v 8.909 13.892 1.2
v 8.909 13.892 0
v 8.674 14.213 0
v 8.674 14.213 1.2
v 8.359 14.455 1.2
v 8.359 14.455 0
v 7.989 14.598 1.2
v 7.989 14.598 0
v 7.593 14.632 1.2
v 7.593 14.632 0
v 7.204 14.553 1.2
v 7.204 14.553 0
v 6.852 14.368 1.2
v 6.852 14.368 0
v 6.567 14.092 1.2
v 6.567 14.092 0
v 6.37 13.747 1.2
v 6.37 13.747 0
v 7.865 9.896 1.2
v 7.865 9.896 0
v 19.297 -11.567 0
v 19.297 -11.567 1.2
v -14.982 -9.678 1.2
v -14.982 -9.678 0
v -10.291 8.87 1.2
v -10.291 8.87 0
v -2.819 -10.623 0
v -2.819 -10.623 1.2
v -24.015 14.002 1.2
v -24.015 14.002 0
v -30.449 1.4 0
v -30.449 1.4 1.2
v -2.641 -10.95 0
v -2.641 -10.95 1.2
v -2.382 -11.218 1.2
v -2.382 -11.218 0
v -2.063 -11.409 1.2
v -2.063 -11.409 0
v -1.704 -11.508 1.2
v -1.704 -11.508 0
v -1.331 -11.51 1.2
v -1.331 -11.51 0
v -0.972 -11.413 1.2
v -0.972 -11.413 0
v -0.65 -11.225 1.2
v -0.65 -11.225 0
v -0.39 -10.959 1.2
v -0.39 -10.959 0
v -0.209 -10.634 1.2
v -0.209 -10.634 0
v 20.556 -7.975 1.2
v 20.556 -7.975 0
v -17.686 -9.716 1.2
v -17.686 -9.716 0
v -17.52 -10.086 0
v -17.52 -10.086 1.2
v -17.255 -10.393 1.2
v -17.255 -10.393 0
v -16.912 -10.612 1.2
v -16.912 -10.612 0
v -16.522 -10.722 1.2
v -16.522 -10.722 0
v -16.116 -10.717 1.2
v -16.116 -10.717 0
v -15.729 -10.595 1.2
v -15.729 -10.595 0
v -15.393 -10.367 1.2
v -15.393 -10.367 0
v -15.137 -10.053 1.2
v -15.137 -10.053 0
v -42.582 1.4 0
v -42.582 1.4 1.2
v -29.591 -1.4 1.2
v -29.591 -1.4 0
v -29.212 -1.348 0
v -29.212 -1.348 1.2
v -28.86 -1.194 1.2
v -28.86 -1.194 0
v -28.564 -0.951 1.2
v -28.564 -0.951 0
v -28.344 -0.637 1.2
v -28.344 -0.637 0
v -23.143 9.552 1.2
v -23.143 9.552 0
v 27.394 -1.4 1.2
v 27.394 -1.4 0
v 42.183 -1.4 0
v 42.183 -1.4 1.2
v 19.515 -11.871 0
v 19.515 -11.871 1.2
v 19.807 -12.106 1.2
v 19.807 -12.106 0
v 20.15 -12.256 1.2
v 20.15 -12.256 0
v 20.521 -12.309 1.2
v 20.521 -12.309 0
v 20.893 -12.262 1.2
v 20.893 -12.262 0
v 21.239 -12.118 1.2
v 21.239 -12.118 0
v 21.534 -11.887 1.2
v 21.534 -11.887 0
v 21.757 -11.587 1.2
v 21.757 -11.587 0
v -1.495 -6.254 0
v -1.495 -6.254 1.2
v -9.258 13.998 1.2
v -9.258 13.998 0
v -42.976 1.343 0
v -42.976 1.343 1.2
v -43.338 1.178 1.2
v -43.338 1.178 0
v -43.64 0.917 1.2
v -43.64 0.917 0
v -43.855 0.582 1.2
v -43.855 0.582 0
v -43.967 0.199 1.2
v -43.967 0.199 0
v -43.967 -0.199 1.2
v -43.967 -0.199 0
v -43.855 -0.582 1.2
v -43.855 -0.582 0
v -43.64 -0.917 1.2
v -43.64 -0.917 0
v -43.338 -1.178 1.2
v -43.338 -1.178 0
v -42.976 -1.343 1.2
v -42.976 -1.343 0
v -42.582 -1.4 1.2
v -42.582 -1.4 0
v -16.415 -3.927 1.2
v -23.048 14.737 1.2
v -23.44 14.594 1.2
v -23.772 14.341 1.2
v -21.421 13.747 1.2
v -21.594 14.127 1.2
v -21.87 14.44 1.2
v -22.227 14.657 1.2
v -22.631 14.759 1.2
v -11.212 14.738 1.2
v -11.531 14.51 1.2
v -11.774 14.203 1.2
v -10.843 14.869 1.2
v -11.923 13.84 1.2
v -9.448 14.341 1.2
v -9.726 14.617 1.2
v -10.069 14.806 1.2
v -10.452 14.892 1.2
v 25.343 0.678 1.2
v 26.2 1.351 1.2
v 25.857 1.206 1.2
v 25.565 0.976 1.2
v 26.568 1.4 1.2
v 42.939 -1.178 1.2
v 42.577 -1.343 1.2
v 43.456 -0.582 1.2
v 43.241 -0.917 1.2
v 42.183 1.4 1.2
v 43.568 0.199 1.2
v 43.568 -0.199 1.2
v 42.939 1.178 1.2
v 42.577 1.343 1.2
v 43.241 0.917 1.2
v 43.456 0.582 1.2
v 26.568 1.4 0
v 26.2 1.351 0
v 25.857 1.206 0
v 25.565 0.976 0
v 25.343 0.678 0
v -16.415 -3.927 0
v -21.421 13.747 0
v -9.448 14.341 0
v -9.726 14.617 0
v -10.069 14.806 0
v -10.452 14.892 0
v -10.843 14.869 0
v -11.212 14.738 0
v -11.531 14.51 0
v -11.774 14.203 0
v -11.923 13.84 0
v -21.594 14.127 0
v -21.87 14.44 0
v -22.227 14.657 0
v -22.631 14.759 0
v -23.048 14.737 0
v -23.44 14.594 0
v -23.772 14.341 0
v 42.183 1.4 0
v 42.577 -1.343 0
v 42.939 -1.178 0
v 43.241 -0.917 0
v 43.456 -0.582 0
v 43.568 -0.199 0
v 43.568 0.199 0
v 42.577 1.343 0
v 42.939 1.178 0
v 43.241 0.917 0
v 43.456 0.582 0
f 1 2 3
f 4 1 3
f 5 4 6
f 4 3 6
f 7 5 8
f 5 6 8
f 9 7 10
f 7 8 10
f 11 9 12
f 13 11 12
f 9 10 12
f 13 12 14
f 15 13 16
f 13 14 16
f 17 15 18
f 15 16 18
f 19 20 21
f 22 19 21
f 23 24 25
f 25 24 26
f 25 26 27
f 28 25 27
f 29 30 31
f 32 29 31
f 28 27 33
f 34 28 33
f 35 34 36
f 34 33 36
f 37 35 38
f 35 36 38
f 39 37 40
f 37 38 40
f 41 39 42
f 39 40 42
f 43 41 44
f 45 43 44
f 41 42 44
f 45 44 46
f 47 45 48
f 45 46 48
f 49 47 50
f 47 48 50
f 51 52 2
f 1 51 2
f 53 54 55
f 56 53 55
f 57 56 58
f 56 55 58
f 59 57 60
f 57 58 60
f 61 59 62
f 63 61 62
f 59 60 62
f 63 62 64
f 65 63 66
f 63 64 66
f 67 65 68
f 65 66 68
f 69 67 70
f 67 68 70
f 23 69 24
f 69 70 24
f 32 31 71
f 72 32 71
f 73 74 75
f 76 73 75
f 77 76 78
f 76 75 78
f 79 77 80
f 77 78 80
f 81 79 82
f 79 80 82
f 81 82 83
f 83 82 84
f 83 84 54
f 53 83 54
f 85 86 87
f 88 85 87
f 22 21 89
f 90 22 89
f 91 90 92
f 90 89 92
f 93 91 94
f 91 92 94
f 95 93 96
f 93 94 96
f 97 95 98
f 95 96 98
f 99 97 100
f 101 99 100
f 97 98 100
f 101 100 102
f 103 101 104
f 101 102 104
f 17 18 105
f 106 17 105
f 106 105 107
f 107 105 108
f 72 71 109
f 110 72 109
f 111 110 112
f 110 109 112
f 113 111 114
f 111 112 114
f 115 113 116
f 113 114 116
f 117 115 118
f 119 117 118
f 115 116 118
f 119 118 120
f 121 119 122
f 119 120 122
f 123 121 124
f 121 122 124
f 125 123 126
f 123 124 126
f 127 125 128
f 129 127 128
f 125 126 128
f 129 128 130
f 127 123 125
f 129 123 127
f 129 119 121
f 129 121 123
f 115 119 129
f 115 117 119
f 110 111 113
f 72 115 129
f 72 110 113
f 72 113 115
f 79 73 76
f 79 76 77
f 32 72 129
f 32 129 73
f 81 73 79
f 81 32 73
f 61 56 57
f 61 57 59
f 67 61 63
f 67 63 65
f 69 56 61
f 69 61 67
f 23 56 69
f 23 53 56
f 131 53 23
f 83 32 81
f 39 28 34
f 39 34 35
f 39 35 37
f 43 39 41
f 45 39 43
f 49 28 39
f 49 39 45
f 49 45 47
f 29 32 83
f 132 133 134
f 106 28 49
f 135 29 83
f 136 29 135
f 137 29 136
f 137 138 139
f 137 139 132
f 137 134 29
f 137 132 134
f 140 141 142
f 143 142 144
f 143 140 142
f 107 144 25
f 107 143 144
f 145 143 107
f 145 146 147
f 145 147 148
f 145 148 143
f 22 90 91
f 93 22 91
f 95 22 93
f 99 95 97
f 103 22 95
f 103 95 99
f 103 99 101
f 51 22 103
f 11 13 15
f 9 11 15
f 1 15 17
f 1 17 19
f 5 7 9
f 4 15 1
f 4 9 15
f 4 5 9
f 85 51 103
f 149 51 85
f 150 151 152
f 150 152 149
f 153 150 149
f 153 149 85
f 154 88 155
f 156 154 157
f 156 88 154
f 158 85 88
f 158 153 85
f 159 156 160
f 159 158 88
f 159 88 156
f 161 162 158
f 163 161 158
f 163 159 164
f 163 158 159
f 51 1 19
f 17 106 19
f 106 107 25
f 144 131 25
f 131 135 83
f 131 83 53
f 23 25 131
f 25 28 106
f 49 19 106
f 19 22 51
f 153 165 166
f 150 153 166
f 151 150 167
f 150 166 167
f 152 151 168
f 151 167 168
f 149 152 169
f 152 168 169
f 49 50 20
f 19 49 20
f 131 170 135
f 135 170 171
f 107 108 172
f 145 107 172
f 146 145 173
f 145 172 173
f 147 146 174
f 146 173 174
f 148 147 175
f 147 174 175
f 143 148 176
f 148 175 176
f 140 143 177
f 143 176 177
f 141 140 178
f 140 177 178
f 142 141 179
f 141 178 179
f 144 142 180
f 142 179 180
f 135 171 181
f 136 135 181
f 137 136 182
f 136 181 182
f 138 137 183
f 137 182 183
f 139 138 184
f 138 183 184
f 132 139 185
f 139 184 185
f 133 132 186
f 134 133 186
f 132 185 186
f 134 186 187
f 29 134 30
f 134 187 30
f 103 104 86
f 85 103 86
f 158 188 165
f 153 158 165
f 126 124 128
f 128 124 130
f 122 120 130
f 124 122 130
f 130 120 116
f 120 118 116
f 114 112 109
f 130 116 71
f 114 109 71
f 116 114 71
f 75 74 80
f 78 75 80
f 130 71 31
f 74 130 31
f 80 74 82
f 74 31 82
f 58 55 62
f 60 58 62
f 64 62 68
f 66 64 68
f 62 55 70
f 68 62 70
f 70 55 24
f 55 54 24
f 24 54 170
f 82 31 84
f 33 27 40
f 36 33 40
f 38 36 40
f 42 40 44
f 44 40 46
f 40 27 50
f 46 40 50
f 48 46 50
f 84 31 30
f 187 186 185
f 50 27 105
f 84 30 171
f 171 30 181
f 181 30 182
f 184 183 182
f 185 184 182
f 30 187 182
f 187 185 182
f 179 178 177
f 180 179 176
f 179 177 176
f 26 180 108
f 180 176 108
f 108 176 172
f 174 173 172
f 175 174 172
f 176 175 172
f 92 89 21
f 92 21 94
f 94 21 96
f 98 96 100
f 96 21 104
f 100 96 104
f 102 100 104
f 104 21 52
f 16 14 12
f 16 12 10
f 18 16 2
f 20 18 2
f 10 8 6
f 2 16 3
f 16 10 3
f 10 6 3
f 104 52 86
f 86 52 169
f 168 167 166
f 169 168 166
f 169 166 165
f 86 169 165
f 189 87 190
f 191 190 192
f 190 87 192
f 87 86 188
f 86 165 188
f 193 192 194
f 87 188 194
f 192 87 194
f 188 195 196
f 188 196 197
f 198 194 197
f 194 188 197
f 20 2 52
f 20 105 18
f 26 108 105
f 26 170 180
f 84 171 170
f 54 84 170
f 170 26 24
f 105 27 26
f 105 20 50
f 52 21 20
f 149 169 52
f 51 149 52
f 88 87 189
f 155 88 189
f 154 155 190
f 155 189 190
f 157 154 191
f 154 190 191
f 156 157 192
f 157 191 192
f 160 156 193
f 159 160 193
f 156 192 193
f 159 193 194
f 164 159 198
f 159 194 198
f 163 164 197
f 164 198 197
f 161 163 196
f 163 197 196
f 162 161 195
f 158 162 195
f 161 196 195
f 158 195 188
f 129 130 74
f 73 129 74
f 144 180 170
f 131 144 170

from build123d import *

# Parameters (mm, degrees)
F1_DEPTH = 1.2


with BuildPart() as f1:
    # F0 (on Top) → F1 (new body)
    with BuildSketch(Plane.XY):
        with BuildLine():
            Line((6.3704812502, 13.7467025459), (-1.494936328, -6.2539292195))
            Line((-1.494936328, -6.2539292195), (-0.7523663042, -8.1910684925))
            Line((-0.7523663042, -8.1910684925), (6.9996274972, 11.521142834))
            Line((6.9996274972, 11.521142834), (6.4376895762, 12.5762100378))
            ThreePointArc((6.4376895762, 12.5762100378), (6.2756574717, 13.154082108), (6.3704812502, 13.7467025459))
        make_face()
        with BuildLine():
            ThreePointArc((21.7679784808, -10.2508880555), (21.9322680974, -10.9201946527), (21.7573096757, -11.5867919448))
            Line((21.7573096757, -11.5867919448), (27.3935520686, -1.4))
            Line((27.3935520686, -1.4), (26.5681530039, -1.4))
            ThreePointArc((26.5681530039, -1.4), (26.2181499387, -1.3555433798), (25.8903753784, -1.2249969349))
            Line((25.8903753784, -1.2249969349), (21.3405117264, -9.4482973485))
            Line((21.3405117264, -9.4482973485), (21.7679784808, -10.2508880555))
        make_face()
        with BuildLine():
            ThreePointArc((19.307315806, -10.2312366939), (19.1323573844, -10.897833986), (19.296647001, -11.5671405832))
            ThreePointArc((19.296647001, -11.5671405832), (20.5211324075, -12.3089696759), (21.7573096757, -11.5867919448))
            ThreePointArc((21.7573096757, -11.5867919448), (21.9322680974, -10.9201946527), (21.7679784808, -10.2508880555))
            Line((21.7679784808, -10.2508880555), (21.3405117264, -9.4482973485))
            Line((21.3405117264, -9.4482973485), (20.5323127409, -10.9090143194))
            Line((20.5323127409, -10.9090143194), (19.7475465303, -9.4355755986))
            Line((19.7475465303, -9.4355755986), (19.307315806, -10.2312366939))
        make_face()
        Polygon((-1.494936328, -6.2539292195), (-2.2541858179, -8.1845920629), (-1.5116157942, -10.1217313359), (-0.7523663042, -8.1910684925), align=None)
        Polygon((20.5557455158, -7.9748586277), (19.7475465303, -9.4355755986), (20.5323127409, -10.9090143194), (21.3405117264, -9.4482973485), align=None)
        with BuildLine():
            ThreePointArc((-0.204371223, -9.6206209378), (-0.1116288117, -10.127768624), (-0.2087417282, -10.6340975802))
            Line((-0.2087417282, -10.6340975802), (7.8650201285, 9.8963238823))
            Line((7.8650201285, 9.8963238823), (6.9996274972, 11.521142834))
            Line((6.9996274972, 11.521142834), (-0.7523663042, -8.1910684925))
            Line((-0.7523663042, -8.1910684925), (-0.204371223, -9.6206209378))
        make_face()
        with BuildLine():
            ThreePointArc((26.5681530039, 1.4), (25.8571286286, 1.2060034568), (25.343156069, 0.6777776255))
            ThreePointArc((25.343156069, 0.6777776255), (25.2226882092, -0.3869424845), (25.8903753784, -1.2249969349))
            Line((25.8903753784, -1.2249969349), (26.5681530039, 0))
            Line((26.5681530039, 0), (27.9681530039, 0))
            ThreePointArc((27.9681530039, 0), (27.5581024975, 0.9899494937), (26.5681530039, 1.4))
        make_face()
        with BuildLine():
            Line((25.343156069, 0.6777776255), (20.5557455158, -7.9748586277))
            Line((20.5557455158, -7.9748586277), (21.3405117264, -9.4482973485))
            Line((21.3405117264, -9.4482973485), (25.8903753784, -1.2249969349))
            ThreePointArc((25.8903753784, -1.2249969349), (25.2226882092, -0.3869424845), (25.343156069, 0.6777776255))
        make_face()
        with BuildLine():
            ThreePointArc((8.9090210561, 13.8924625655), (7.5931011225, 14.6320341461), (6.3704812502, 13.7467025459))
            ThreePointArc((6.3704812502, 13.7467025459), (6.2756574717, 13.154082108), (6.4376895762, 12.5762100378))
            Line((6.4376895762, 12.5762100378), (6.9996274972, 11.521142834))
            Line((6.9996274972, 11.521142834), (7.6733553161, 13.2343363017))
            Line((7.6733553161, 13.2343363017), (8.5387479474, 11.6095173501))
            Line((8.5387479474, 11.6095173501), (8.9762293821, 12.7219700574))
            ThreePointArc((8.9762293821, 12.7219700574), (9.0710531606, 13.3145904953), (8.9090210561, 13.8924625655))
        make_face()
        Polygon((-11.1613144434, 11.1400828532), (-10.291221096, 8.8702740266), (-9.6952787124, 11.2269554259), (-10.5653720597, 13.4967642526), align=None)
        with BuildLine():
            Line((-11.9226489058, 13.8399836623), (-16.4153779515, -3.9267187325))
            Line((-16.4153779515, -3.9267187325), (-15.6524504368, -6.6203197433))
            Line((-15.6524504368, -6.6203197433), (-11.1613144434, 11.1400828532))
            Line((-11.1613144434, 11.1400828532), (-11.8726166309, 12.9956538545))
            ThreePointArc((-11.8726166309, 12.9956538545), (-11.9629205569, 13.4139500136), (-11.9226489058, 13.8399836623))
        make_face()
        with BuildLine():
            ThreePointArc((-9.2581274886, 13.9978746507), (-10.6481862987, 14.8943127497), (-11.9226489058, 13.8399836623))
            ThreePointArc((-11.9226489058, 13.8399836623), (-11.9629205569, 13.4139500136), (-11.8726166309, 12.9956538545))
            Line((-11.8726166309, 12.9956538545), (-11.1613144434, 11.1400828532))
            Line((-11.1613144434, 11.1400828532), (-10.5653720597, 13.4967642526))
            Line((-10.5653720597, 13.4967642526), (-9.6952787124, 11.2269554259))
            Line((-9.6952787124, 11.2269554259), (-9.2080952137, 13.1535448428))
            ThreePointArc((-9.2080952137, 13.1535448428), (-9.1678235626, 13.5795784916), (-9.2581274886, 13.9978746507))
        make_face()
        with BuildLine():
            Line((-9.2080952137, 13.1535448428), (-9.6952787124, 11.2269554259))
            Line((-9.6952787124, 11.2269554259), (-2.2541858179, -8.1845920629))
            Line((-2.2541858179, -8.1845920629), (-1.494936328, -6.2539292195))
            Line((-1.494936328, -6.2539292195), (-9.2581274886, 13.9978746507))
            ThreePointArc((-9.2581274886, 13.9978746507), (-9.1678235626, 13.5795784916), (-9.2080952137, 13.1535448428))
        make_face()
        with BuildLine():
            Line((27.7931499387, -0.6777776255), (27.3935520686, -1.4))
            Line((27.3935520686, -1.4), (42.1826000015, -1.4))
            ThreePointArc((42.1826000015, -1.4), (43.5826000015, 0), (42.1826000015, 1.4))
            Line((42.1826000015, 1.4), (26.5681530039, 1.4))
            ThreePointArc((26.5681530039, 1.4), (27.5581024975, 0.9899494937), (27.9681530039, 0))
            ThreePointArc((27.9681530039, 0), (27.9236963836, -0.3500030651), (27.7931499387, -0.6777776255))
        make_face()
        with BuildLine():
            ThreePointArc((-29.5913815498, -1.4), (-30.5813310435, -0.9899494937), (-30.9913815498, 0))
            ThreePointArc((-30.9913815498, 0), (-30.9525728971, 0.327350143), (-30.8382985268, 0.6365516888))
            Line((-30.8382985268, 0.6365516888), (-30.4485578137, 1.4))
            Line((-30.4485578137, 1.4), (-42.5815542539, 1.4))
            ThreePointArc((-42.5815542539, 1.4), (-43.9815542539, 0), (-42.5815542539, -1.4))
            Line((-42.5815542539, -1.4), (-29.5913815498, -1.4))
        make_face()
        with BuildLine():
            Line((-29.5913815498, 0), (-30.9913815498, 0))
            ThreePointArc((-30.9913815498, 0), (-30.5813310435, -0.9899494937), (-29.5913815498, -1.4))
            ThreePointArc((-29.5913815498, -1.4), (-28.8603454236, -1.1939791381), (-28.3444645728, -0.6365516888))
            ThreePointArc((-28.3444645728, -0.6365516888), (-28.2595680841, 0.4315934343), (-28.9548298611, 1.246916977))
            Line((-28.9548298611, 1.246916977), (-29.5913815498, 0))
        make_face()
        with BuildLine():
            ThreePointArc((-29.5913815498, 1.4), (-29.2640314069, 1.3611913473), (-28.9548298611, 1.246916977))
            Line((-28.9548298611, 1.246916977), (-23.7041070264, 11.532358929))
            Line((-23.7041070264, 11.532358929), (-24.1152732197, 12.9840272101))
            ThreePointArc((-24.1152732197, 12.9840272101), (-24.1615440312, 13.5025345407), (-24.0151787573, 14.0021024005))
            Line((-24.0151787573, 14.0021024005), (-30.4485578137, 1.4))
            Line((-30.4485578137, 1.4), (-29.5913815498, 1.4))
        make_face()
        with BuildLine():
            Line((-23.7041070264, 11.532358929), (-28.9548298611, 1.246916977))
            ThreePointArc((-28.9548298611, 1.246916977), (-28.2595680841, 0.4315934343), (-28.3444645728, -0.6365516888))
            Line((-28.3444645728, -0.6365516888), (-23.1431989939, 9.5520103193))
            Line((-23.1431989939, 9.5520103193), (-23.7041070264, 11.532358929))
        make_face()
        with BuildLine():
            Line((-24.1152732197, 12.9840272101), (-23.7041070264, 11.532358929))
            Line((-23.7041070264, 11.532358929), (-22.7682617803, 13.3655507118))
            Line((-22.7682617803, 13.3655507118), (-22.2073537479, 11.3852021021))
            Line((-22.2073537479, 11.3852021021), (-21.5213448033, 12.728999023))
            ThreePointArc((-21.5213448033, 12.728999023), (-21.3749795295, 13.2285668828), (-21.421250341, 13.7470742134))
            ThreePointArc((-21.421250341, 13.7470742134), (-22.6312779514, 14.7588329626), (-24.0151787573, 14.0021024005))
            ThreePointArc((-24.0151787573, 14.0021024005), (-24.1615440312, 13.5025345407), (-24.1152732197, 12.9840272101))
        make_face()
        Polygon((-22.7682617803, 13.3655507118), (-23.7041070264, 11.532358929), (-23.1431989939, 9.5520103193), (-22.2073537479, 11.3852021021), align=None)
        with BuildLine():
            Line((-21.5213448033, 12.728999023), (-22.2073537479, 11.3852021021))
            Line((-22.2073537479, 11.3852021021), (-17.1017092788, -6.6408473417))
            Line((-17.1017092788, -6.6408473417), (-16.4153779515, -3.9267187325))
            Line((-16.4153779515, -3.9267187325), (-21.421250341, 13.7470742134))
            ThreePointArc((-21.421250341, 13.7470742134), (-21.3749795295, 13.2285668828), (-21.5213448033, 12.728999023))
        make_face()
        with BuildLine():
            Line((-22.2073537479, 11.3852021021), (-23.1431989939, 9.5520103193))
            Line((-23.1431989939, 9.5520103193), (-17.6857932034, -9.7159718541))
            ThreePointArc((-17.6857932034, -9.7159718541), (-17.738641348, -9.3542762497), (-17.6960586101, -8.9912289427))
            Line((-17.6960586101, -8.9912289427), (-17.1017092788, -6.6408473417))
            Line((-17.1017092788, -6.6408473417), (-22.2073537479, 11.3852021021))
        make_face()
        with BuildLine():
            ThreePointArc((-17.6960586101, -8.9912289427), (-17.738641348, -9.3542762497), (-17.6857932034, -9.7159718541))
            ThreePointArc((-17.6857932034, -9.7159718541), (-16.3189538669, -10.7343079363), (-14.9815049181, -9.6776677622))
            ThreePointArc((-14.9815049181, -9.6776677622), (-14.9389221803, -9.3146204552), (-14.9917703248, -8.9529248508))
            Line((-14.9917703248, -8.9529248508), (-15.6524504368, -6.6203197433))
            Line((-15.6524504368, -6.6203197433), (-16.3387817641, -9.3344483525))
            Line((-16.3387817641, -9.3344483525), (-17.1017092788, -6.6408473417))
            Line((-17.1017092788, -6.6408473417), (-17.6960586101, -8.9912289427))
        make_face()
        Polygon((-16.4153779515, -3.9267187325), (-17.1017092788, -6.6408473417), (-16.3387817641, -9.3344483525), (-15.6524504368, -6.6203197433), align=None)
        with BuildLine():
            ThreePointArc((-14.9917703248, -8.9529248508), (-14.9389221803, -9.3146204552), (-14.9815049181, -9.6776677622))
            Line((-14.9815049181, -9.6776677622), (-10.291221096, 8.8702740266))
            Line((-10.291221096, 8.8702740266), (-11.1613144434, 11.1400828532))
            Line((-11.1613144434, 11.1400828532), (-15.6524504368, -6.6203197433))
            Line((-15.6524504368, -6.6203197433), (-14.9917703248, -8.9529248508))
        make_face()
        Polygon((6.9996274972, 11.521142834), (7.8650201285, 9.8963238823), (8.5387479474, 11.6095173501), (7.6733553161, 13.2343363017), align=None)
        with BuildLine():
            Line((-9.6952787124, 11.2269554259), (-10.291221096, 8.8702740266))
            Line((-10.291221096, 8.8702740266), (-2.8188603653, -10.622841734))
            ThreePointArc((-2.8188603653, -10.622841734), (-2.9116027766, -10.1156940479), (-2.8144898601, -9.6093650917))
            Line((-2.8144898601, -9.6093650917), (-2.2541858179, -8.1845920629))
            Line((-2.2541858179, -8.1845920629), (-9.6952787124, 11.2269554259))
        make_face()
        with BuildLine():
            Line((8.5387479474, 11.6095173501), (7.8650201285, 9.8963238823))
            Line((7.8650201285, 9.8963238823), (19.296647001, -11.5671405832))
            ThreePointArc((19.296647001, -11.5671405832), (19.1323573844, -10.897833986), (19.307315806, -10.2312366939))
            Line((19.307315806, -10.2312366939), (19.7475465303, -9.4355755986))
            Line((19.7475465303, -9.4355755986), (8.5387479474, 11.6095173501))
        make_face()
        with BuildLine():
            ThreePointArc((-2.8144898601, -9.6093650917), (-2.9116027766, -10.1156940479), (-2.8188603653, -10.622841734))
            ThreePointArc((-2.8188603653, -10.622841734), (-1.5176530822, -11.5217183184), (-0.2087417282, -10.6340975802))
            ThreePointArc((-0.2087417282, -10.6340975802), (-0.1116288117, -10.127768624), (-0.204371223, -9.6206209378))
            Line((-0.204371223, -9.6206209378), (-0.7523663042, -8.1910684925))
            Line((-0.7523663042, -8.1910684925), (-1.5116157942, -10.1217313359))
            Line((-1.5116157942, -10.1217313359), (-2.2541858179, -8.1845920629))
            Line((-2.2541858179, -8.1845920629), (-2.8144898601, -9.6093650917))
        make_face()
        with BuildLine():
            Line((8.9762293821, 12.7219700574), (8.5387479474, 11.6095173501))
            Line((8.5387479474, 11.6095173501), (19.7475465303, -9.4355755986))
            Line((19.7475465303, -9.4355755986), (20.5557455158, -7.9748586277))
            Line((20.5557455158, -7.9748586277), (8.9090210561, 13.8924625655))
            ThreePointArc((8.9090210561, 13.8924625655), (9.0710531606, 13.3145904953), (8.9762293821, 12.7219700574))
        make_face()
        with BuildLine():
            ThreePointArc((-30.8382985268, 0.6365516888), (-30.9525728971, 0.327350143), (-30.9913815498, 0))
            Line((-30.9913815498, 0), (-29.5913815498, 0))
            Line((-29.5913815498, 0), (-28.9548298611, 1.246916977))
            ThreePointArc((-28.9548298611, 1.246916977), (-29.2640314069, 1.3611913473), (-29.5913815498, 1.4))
            Line((-29.5913815498, 1.4), (-30.4485578137, 1.4))
            Line((-30.4485578137, 1.4), (-30.8382985268, 0.6365516888))
        make_face()
        with BuildLine():
            Line((26.5681530039, -1.4), (27.3935520686, -1.4))
            Line((27.3935520686, -1.4), (27.7931499387, -0.6777776255))
            ThreePointArc((27.7931499387, -0.6777776255), (27.9236963836, -0.3500030651), (27.9681530039, 0))
            Line((27.9681530039, 0), (26.5681530039, 0))
            Line((26.5681530039, 0), (25.8903753784, -1.2249969349))
            ThreePointArc((25.8903753784, -1.2249969349), (26.2181499387, -1.3555433798), (26.5681530039, -1.4))
        make_face()
    extrude(amount=F1_DEPTH)


solid = f1.part
